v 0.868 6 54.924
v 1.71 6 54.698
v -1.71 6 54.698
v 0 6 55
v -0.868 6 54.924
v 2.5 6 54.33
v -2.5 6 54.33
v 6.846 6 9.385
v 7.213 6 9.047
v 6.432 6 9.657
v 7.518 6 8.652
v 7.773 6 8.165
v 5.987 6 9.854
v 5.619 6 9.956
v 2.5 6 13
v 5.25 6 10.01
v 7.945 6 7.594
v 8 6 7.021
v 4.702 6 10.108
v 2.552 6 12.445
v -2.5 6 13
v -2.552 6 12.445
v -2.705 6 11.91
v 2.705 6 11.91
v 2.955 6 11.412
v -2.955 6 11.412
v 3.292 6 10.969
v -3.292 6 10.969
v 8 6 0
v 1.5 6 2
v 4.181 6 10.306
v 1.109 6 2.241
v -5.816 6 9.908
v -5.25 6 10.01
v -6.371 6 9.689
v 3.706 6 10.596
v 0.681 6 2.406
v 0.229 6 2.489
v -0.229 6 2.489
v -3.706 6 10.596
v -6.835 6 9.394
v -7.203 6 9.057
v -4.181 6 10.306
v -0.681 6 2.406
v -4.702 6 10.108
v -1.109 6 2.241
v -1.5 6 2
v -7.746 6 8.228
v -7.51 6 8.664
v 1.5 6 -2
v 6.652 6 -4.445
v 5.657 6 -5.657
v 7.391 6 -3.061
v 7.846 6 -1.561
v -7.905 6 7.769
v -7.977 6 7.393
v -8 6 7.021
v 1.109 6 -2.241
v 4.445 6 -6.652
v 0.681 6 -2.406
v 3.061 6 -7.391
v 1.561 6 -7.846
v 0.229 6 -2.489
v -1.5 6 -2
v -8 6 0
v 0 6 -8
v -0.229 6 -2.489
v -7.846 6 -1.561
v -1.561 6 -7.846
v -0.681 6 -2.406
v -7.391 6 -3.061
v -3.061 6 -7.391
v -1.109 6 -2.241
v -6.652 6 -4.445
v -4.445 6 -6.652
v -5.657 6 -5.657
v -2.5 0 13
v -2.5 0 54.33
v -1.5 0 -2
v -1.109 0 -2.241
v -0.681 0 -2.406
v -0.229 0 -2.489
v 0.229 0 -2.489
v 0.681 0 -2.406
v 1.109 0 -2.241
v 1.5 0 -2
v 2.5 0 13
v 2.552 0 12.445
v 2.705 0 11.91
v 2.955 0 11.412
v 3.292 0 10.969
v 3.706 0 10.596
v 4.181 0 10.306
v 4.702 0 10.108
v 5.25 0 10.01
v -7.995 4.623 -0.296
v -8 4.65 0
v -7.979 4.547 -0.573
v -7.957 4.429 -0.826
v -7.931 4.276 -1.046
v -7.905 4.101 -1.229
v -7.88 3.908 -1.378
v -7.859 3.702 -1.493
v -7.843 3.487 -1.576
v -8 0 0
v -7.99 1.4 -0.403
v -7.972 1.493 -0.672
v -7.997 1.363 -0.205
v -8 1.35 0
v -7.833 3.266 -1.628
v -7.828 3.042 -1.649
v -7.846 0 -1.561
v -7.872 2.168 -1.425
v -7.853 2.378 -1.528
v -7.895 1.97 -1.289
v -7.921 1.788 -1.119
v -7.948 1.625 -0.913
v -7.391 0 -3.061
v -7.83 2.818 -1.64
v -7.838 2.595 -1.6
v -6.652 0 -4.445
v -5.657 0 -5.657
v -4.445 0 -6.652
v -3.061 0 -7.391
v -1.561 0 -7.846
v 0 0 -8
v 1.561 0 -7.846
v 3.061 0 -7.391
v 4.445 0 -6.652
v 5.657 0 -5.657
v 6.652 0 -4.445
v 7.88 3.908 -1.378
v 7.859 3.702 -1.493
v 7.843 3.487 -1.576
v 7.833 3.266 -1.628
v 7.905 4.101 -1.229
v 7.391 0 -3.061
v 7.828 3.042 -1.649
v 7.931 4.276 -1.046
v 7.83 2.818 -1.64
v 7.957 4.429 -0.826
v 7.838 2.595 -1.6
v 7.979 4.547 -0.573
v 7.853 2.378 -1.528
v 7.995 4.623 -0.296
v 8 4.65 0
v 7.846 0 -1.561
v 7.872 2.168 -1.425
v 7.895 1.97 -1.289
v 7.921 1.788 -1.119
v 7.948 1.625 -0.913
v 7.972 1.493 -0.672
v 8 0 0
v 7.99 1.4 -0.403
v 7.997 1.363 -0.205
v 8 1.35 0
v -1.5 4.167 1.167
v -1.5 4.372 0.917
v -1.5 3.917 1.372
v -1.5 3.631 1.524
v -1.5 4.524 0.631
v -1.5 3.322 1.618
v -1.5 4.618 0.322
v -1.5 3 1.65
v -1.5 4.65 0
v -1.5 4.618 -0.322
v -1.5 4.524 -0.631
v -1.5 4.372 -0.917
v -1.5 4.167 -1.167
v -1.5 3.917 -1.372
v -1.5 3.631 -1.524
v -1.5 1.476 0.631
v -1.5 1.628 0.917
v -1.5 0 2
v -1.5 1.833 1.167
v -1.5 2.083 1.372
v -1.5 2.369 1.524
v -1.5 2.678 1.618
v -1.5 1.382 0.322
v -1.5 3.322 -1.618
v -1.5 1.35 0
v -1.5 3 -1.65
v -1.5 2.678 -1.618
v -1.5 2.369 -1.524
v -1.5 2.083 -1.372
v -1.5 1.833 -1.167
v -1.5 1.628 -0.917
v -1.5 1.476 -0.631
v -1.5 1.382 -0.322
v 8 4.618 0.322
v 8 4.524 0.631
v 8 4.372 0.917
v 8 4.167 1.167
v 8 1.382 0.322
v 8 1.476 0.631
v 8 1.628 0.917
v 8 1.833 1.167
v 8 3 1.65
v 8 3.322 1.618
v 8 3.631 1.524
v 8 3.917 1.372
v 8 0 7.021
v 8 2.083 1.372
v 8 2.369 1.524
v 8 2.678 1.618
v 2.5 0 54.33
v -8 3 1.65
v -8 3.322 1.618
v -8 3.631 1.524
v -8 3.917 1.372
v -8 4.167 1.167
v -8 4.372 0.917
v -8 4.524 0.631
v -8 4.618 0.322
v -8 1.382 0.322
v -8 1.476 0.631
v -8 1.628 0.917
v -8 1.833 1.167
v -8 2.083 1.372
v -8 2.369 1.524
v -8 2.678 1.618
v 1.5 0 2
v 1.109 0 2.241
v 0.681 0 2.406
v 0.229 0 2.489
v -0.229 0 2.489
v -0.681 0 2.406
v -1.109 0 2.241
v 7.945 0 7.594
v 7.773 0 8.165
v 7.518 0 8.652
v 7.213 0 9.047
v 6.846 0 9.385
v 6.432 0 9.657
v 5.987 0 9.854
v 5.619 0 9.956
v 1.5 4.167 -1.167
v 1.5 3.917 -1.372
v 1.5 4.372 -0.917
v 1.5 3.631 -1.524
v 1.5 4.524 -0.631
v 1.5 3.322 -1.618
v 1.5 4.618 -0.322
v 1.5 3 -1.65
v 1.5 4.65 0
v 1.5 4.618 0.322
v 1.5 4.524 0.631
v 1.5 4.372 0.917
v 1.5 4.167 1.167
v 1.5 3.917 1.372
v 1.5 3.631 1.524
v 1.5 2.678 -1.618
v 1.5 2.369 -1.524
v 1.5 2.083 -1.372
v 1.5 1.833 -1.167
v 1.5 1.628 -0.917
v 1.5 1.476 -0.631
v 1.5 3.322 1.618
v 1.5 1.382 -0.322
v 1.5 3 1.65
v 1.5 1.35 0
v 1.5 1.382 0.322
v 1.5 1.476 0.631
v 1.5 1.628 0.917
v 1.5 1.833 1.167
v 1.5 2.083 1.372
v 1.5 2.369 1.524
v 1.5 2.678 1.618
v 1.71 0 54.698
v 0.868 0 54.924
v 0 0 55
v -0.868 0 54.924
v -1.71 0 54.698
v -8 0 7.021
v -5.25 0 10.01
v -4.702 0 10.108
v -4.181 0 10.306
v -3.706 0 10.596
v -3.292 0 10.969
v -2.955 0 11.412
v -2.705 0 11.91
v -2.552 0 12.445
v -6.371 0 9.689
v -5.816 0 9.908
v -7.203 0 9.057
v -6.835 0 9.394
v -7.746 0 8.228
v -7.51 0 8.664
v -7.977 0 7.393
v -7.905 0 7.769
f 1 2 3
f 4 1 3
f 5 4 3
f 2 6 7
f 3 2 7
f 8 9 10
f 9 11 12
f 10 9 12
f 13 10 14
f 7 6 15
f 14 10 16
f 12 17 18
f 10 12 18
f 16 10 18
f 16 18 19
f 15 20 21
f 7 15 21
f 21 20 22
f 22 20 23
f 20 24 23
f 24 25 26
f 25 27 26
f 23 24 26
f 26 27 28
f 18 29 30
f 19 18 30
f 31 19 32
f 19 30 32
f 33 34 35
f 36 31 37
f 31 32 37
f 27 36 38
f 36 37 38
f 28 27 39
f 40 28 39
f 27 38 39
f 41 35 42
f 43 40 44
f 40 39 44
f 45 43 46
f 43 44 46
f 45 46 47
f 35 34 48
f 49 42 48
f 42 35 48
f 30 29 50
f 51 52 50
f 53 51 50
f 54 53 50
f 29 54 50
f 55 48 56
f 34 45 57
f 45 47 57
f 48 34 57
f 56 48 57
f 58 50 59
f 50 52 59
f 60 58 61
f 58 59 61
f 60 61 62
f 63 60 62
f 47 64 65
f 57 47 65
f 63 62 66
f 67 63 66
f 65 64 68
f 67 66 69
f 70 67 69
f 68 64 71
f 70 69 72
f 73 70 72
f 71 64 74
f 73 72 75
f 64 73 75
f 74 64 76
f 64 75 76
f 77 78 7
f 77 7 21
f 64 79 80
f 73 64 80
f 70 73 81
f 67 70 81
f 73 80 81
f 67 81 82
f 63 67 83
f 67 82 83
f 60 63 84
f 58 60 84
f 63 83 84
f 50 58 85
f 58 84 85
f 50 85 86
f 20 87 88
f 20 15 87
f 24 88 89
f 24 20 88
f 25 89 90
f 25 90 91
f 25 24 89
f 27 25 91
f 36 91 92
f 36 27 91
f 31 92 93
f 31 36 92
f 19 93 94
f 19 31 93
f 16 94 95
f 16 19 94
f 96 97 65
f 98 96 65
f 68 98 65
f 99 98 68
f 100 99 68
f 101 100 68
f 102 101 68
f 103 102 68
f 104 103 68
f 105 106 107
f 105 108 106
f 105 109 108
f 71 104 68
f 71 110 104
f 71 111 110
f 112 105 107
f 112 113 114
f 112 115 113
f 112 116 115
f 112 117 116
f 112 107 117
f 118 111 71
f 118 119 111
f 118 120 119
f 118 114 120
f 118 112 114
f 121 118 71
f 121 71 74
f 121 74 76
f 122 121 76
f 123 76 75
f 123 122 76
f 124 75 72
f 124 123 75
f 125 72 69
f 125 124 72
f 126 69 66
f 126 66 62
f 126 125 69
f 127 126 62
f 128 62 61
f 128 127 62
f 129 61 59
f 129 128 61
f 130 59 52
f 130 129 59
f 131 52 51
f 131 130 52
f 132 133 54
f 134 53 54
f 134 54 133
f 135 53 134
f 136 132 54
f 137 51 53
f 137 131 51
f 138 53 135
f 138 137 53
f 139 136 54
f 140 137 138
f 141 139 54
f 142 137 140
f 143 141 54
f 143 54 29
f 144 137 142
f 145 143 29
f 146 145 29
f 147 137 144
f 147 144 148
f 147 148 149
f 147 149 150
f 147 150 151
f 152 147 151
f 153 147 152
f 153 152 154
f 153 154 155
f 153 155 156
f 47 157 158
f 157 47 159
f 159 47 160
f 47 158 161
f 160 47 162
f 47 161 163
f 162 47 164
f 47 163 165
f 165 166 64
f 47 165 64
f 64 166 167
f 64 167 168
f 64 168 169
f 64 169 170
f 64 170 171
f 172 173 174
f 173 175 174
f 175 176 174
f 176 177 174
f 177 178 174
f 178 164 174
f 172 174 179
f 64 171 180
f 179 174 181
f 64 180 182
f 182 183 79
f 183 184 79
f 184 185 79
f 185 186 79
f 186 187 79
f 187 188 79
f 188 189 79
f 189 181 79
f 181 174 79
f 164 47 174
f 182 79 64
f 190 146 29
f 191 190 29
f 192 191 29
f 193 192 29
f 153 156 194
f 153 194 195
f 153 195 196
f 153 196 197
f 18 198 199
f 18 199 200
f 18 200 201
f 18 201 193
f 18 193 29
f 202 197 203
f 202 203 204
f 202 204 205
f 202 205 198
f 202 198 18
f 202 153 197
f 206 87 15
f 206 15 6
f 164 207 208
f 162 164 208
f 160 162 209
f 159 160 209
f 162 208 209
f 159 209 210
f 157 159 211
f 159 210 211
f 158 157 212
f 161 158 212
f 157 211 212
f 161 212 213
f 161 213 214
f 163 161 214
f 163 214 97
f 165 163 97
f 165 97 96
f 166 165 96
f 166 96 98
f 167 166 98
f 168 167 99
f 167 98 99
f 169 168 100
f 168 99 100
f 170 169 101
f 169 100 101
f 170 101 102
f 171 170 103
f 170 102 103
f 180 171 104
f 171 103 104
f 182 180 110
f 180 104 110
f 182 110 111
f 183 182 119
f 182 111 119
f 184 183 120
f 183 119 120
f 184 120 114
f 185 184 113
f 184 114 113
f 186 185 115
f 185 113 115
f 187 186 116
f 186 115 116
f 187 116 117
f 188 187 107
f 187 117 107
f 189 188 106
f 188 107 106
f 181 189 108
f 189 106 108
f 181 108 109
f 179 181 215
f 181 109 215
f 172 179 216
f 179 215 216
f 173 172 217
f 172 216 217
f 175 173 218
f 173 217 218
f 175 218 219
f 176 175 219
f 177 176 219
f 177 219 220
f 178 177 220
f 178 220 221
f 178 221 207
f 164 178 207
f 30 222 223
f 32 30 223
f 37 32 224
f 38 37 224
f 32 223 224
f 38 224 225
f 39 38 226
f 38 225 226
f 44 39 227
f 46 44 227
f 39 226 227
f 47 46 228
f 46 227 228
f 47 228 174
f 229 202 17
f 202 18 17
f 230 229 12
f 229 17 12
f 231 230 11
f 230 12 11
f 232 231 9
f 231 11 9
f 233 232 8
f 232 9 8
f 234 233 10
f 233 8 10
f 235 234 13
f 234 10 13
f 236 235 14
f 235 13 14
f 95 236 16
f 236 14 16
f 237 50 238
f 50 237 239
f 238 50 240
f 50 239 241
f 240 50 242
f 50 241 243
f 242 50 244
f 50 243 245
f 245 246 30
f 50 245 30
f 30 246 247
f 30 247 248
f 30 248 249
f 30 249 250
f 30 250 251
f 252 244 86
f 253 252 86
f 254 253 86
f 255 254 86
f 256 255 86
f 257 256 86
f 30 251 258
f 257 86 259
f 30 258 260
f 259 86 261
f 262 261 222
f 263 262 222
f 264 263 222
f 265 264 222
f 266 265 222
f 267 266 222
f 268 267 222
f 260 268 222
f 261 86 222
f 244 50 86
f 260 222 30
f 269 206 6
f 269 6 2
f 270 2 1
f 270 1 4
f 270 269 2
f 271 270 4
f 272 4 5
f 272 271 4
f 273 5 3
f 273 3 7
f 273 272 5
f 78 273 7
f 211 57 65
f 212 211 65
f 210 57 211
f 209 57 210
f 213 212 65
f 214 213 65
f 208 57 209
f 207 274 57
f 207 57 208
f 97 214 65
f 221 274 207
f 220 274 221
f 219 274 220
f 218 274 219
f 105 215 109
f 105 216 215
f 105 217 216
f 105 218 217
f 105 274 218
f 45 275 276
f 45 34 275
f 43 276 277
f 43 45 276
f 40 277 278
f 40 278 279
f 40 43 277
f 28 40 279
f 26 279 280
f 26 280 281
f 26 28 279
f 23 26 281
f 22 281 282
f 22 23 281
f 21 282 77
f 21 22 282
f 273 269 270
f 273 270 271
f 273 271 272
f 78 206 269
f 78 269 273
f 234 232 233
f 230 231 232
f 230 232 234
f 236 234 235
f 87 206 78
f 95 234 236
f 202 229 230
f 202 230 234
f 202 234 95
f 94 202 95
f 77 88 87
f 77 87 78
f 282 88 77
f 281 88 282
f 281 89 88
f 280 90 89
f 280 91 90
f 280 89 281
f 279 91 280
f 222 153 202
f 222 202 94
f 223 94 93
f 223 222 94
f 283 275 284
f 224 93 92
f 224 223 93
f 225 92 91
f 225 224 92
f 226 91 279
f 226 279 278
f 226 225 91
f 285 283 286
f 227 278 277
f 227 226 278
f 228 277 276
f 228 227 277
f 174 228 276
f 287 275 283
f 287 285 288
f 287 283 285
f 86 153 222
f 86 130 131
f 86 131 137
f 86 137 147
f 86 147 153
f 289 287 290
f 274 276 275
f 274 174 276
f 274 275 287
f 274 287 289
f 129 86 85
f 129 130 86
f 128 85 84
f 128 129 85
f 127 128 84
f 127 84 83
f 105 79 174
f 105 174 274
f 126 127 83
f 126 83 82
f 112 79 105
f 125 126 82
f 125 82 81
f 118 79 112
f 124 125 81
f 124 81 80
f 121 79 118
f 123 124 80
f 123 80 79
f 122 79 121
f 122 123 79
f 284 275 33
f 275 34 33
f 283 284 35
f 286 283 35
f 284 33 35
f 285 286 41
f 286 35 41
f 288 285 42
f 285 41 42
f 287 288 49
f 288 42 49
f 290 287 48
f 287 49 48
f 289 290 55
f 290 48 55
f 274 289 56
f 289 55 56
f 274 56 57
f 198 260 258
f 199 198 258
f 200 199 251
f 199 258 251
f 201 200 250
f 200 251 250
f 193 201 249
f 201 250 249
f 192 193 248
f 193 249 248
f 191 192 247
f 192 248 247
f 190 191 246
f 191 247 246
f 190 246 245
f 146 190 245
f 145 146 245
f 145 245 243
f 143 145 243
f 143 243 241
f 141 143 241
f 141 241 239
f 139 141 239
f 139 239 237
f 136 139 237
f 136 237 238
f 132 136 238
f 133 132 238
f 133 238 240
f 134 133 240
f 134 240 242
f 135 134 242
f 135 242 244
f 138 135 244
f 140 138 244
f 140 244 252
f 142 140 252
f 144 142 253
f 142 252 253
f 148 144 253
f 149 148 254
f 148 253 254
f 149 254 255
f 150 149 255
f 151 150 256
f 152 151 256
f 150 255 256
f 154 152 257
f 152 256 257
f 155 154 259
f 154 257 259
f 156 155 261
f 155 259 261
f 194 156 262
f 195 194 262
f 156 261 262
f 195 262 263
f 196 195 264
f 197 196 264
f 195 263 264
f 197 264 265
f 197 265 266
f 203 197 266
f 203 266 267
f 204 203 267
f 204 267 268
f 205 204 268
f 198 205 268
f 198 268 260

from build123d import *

# Parameters (mm, degrees)
BOSS_EXTRU_1_DEPTH                        = 6
TROU_POUR_TARAUDAGE_POUR_TROU_TARAUD_M4_D = 3.3
CONG_1_R                                  = 3
CONG_2_R                                  = 3
CONG_3_R                                  = 3


with BuildPart() as part:
    # Esquisse1 → Boss.-Extru.1 (new body)
    with BuildSketch(Plane(origin=(0, 0, 0), x_dir=(1, 0, 0), z_dir=(0, 1, 0))):
        with BuildLine():
            Line((8, 0), (8, -10))
            Line((8, -10), (2.5, -10))
            Line((2.5, -10), (2.5, -54.330127019))
            ThreePointArc((2.5, -54.330127019), (0, -55), (-2.5, -54.330127019))
            Line((-2.5, -54.330127019), (-2.5, -10))
            Line((-2.5, -10), (-8, -10))
            Line((-8, -10), (-8, 0))
            ThreePointArc((-8, 0), (0, 8), (8, 0))
        make_face()
        with BuildLine():
            Line((1.5, 2), (1.5, -2))
            ThreePointArc((1.5, -2), (0, -2.5), (-1.5, -2))
            Line((-1.5, -2), (-1.5, 2))
            ThreePointArc((-1.5, 2), (0, 2.5), (1.5, 2))
        make_face(mode=Mode.SUBTRACT)
    extrude(amount=BOSS_EXTRU_1_DEPTH)

    # Trou pour taraudage pour trou taraudé M41 (through all)
    with Locations(Plane(origin=(8, 0, 0), x_dir=(0, 0, -1), z_dir=(1, 0, 0))):
        with Locations((0, 3)):
            Hole(TROU_POUR_TARAUDAGE_POUR_TROU_TARAUD_M4_D / 2)

    # Congé1
    cong_1_edges = [part.edges().sort_by_distance(p)[0] for p in [
        (-2.5, 3, 10),
    ]]
    fillet(cong_1_edges, radius=CONG_1_R)

    # Congé2
    cong_2_edges = [part.edges().sort_by_distance(p)[0] for p in [
        (-8, 3, 10),
        (2.5, 3, 10),
    ]]
    fillet(cong_2_edges, radius=CONG_2_R)

    # Congé3
    cong_3_edges = [part.edges().sort_by_distance(p)[0] for p in [
        (8, 3, 10),
    ]]
    fillet(cong_3_edges, radius=CONG_3_R)


solid = part.part
